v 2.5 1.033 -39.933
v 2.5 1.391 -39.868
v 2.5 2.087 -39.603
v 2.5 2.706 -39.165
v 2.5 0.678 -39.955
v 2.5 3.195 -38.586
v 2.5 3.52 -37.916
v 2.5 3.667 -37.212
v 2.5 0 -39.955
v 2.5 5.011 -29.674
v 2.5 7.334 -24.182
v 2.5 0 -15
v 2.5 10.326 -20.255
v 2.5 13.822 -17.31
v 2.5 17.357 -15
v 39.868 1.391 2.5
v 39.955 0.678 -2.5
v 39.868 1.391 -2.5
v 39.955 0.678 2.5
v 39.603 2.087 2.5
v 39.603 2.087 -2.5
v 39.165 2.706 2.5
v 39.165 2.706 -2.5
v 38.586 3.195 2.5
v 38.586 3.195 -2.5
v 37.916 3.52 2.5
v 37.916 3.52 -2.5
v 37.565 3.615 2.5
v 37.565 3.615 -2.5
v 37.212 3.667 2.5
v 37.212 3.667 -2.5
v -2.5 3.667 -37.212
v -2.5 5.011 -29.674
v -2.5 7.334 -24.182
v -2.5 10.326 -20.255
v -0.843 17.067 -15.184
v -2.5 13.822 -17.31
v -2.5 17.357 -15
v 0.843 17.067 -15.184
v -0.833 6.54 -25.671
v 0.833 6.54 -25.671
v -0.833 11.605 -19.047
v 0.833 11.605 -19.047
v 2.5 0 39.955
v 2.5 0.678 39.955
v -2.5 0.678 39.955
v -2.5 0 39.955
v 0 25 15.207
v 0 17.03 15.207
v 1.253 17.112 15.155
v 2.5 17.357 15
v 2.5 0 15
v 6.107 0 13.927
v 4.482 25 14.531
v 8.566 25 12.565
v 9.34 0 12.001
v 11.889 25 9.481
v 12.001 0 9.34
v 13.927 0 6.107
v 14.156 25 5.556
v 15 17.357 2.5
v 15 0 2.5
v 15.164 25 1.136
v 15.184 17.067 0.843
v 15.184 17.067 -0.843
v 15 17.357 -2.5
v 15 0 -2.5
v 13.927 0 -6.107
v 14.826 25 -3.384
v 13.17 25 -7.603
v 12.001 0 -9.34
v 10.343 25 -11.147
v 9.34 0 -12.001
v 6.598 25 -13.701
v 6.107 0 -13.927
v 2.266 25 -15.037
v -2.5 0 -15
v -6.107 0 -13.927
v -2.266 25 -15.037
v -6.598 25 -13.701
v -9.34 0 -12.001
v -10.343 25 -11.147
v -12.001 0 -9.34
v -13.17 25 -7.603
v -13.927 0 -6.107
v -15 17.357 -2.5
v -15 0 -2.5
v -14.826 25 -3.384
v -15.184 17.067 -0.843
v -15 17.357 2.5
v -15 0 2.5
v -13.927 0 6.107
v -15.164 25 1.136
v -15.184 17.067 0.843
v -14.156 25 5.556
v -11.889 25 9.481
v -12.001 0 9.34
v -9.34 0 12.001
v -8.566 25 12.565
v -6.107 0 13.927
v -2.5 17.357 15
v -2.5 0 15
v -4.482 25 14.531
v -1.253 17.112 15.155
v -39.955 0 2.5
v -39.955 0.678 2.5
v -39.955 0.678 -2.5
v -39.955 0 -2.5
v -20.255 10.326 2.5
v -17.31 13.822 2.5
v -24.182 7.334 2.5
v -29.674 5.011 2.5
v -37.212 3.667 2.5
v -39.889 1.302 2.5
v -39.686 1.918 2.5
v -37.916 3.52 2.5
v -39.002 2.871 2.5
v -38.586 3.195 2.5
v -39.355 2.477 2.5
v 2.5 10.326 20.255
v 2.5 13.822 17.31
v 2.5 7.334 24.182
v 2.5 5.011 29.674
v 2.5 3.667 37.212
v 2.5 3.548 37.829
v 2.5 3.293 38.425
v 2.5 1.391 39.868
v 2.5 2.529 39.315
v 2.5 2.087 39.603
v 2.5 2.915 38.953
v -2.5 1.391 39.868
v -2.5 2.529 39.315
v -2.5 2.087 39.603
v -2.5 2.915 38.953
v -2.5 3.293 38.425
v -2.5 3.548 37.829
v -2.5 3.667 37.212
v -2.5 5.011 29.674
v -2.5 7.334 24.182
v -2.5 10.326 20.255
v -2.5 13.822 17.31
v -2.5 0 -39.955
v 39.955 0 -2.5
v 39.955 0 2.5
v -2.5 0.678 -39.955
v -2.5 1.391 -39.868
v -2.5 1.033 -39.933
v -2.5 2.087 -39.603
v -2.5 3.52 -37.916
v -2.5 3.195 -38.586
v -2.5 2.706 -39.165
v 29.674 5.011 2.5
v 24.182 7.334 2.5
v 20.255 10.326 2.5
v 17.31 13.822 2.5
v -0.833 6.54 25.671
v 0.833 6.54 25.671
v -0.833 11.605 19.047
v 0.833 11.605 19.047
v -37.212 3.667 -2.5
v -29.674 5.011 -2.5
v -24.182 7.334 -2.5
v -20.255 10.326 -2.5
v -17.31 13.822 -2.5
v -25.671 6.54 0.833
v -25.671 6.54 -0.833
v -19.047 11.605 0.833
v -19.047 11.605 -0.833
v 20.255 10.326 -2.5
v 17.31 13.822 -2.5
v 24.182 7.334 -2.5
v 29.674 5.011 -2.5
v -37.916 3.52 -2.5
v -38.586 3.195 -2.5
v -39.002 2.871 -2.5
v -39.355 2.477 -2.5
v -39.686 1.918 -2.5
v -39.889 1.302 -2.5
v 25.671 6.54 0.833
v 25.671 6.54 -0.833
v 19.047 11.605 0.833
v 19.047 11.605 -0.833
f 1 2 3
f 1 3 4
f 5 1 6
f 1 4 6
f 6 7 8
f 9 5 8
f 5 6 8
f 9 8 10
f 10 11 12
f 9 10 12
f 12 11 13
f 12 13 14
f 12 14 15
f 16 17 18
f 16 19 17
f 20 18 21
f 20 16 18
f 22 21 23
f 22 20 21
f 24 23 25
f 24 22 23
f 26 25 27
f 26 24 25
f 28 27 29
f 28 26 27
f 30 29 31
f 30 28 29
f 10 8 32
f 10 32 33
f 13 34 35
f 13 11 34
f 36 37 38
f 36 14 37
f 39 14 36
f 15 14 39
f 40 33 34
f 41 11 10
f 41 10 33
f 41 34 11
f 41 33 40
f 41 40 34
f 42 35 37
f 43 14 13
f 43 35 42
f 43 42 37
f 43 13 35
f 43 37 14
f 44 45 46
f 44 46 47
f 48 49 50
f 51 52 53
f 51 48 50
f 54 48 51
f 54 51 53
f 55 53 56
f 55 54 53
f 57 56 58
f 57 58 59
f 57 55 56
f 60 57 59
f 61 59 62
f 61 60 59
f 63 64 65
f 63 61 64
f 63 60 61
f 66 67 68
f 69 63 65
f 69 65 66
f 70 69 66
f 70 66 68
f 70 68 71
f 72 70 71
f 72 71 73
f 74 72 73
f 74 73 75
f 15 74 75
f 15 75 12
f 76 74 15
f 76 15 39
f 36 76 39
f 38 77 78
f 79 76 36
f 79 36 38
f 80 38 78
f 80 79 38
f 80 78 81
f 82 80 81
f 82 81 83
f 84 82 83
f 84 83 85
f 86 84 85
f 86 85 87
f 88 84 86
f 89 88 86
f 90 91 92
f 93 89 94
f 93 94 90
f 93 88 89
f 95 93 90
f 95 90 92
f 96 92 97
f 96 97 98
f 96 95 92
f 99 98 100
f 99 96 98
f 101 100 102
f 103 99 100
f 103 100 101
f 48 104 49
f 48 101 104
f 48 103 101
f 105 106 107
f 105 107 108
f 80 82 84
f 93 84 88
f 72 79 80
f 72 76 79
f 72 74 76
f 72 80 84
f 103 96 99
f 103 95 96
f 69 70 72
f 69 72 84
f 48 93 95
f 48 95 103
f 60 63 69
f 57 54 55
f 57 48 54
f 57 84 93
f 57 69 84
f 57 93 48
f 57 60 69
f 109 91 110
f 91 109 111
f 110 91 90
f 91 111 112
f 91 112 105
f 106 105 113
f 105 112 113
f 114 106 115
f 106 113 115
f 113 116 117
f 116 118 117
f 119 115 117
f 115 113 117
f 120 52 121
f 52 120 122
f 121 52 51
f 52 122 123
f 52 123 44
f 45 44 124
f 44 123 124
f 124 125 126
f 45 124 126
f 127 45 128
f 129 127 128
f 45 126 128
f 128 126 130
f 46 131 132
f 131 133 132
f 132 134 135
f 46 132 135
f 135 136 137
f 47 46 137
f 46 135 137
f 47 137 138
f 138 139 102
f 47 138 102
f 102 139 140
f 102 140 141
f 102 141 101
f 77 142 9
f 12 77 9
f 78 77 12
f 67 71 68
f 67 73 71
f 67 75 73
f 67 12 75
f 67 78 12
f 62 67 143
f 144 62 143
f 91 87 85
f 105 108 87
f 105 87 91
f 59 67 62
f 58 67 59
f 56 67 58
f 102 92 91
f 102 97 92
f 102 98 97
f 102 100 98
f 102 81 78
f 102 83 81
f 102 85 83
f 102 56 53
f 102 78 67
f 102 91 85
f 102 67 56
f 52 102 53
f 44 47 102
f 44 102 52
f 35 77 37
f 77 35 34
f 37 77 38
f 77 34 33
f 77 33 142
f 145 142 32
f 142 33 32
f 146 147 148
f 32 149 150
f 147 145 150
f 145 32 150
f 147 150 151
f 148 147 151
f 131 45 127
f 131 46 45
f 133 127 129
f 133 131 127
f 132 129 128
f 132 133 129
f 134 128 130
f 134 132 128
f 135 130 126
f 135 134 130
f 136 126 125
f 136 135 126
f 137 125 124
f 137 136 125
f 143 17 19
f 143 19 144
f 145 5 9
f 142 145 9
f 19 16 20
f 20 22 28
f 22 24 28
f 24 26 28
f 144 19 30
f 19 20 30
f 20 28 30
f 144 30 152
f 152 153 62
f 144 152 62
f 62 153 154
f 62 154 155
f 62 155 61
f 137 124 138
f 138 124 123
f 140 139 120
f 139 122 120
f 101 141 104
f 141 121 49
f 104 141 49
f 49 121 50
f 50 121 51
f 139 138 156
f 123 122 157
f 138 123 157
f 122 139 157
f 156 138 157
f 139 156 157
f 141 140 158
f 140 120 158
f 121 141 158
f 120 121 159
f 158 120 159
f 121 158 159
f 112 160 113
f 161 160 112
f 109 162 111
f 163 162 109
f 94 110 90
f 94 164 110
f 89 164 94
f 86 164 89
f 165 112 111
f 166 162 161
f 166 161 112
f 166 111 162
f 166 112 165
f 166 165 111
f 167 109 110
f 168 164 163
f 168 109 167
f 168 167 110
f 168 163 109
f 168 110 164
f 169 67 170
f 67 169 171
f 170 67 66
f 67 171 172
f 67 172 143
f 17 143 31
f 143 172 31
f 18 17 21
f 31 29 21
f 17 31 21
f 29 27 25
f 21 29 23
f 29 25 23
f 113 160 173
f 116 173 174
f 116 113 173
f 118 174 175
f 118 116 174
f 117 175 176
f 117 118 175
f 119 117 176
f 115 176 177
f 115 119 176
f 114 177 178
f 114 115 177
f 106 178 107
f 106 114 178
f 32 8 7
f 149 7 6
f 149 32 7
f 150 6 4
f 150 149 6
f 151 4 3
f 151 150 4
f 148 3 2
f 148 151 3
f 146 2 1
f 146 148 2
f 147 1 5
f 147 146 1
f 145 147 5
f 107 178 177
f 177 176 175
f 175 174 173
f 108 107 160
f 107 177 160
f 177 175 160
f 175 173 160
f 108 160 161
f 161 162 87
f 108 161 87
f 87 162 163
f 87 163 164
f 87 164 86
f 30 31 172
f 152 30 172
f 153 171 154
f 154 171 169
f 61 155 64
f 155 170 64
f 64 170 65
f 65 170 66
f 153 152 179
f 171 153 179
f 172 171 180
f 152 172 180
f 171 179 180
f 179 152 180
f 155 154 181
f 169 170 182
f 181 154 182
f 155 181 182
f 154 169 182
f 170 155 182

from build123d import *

# Parameters (mm, degrees)
SKETCH3_W           = 30
SKETCH3_H           = 5
SKETCH3_W_2         = 5
SKETCH3_H_2         = 30
BOSS_EXTRUDE2_DEPTH = 25
CUT_EXTRUDE2_DEPTH  = 35.003676272
BOSS_EXTRUDE3_DEPTH = 5
SKETCH9_W           = 12.5
SKETCH9_H           = 5
CUT_EXTRUDE3_DEPTH  = 50.460787365
CIRPATTERN9_COUNT   = 4
SKETCH11_W          = 30
SKETCH11_H          = 25
BOSS_EXTRUDE5_DEPTH = 2.5
FILLET1_R           = 3
BOSS_EXTRUDE6_REACH = 63.788
SKETCH12_R          = 15.206906326


with BuildPart() as part:
    # Sketch3 → Boss-Extrude2 (new body)
    with BuildSketch(Plane(origin=(0, 0, 0), x_dir=(1, 0, 0), z_dir=(0, 1, 0))):
        Rectangle(SKETCH3_W, SKETCH3_H)
        Rectangle(SKETCH3_W_2, SKETCH3_H_2)
    extrude(amount=BOSS_EXTRUDE2_DEPTH)

    # Sketch4 → Cut-Extrude2 (cut, symmetric)
    with BuildSketch(Plane(origin=(2.5, 0, 0), x_dir=(0, 0, -1), z_dir=(1, 0, 0))):
        with BuildLine():
            Line((-15, 25), (-15, 17.357377201))
            add(Edge.make_bspline(
                [(-15, 17.357377201), (-12.472140197, 21.356054213), (-10.128526377, 24.727998236), (-4.127581327, 25)],
                knots=[0.577139171, 0.577139171, 0.577139171, 0.577139171, 0.966590179, 0.966590179, 0.966590179, 0.966590179], degree=3))
            Line((-4.127581327, 25), (-15, 25))
        make_face()
    cut_extrude2 = extrude(amount=CUT_EXTRUDE2_DEPTH, both=True, mode=Mode.SUBTRACT)

    # Sketch5 → Boss-Extrude3 (add)
    with BuildSketch(Plane(origin=(2.5, 0, 0), x_dir=(0, 0, -1), z_dir=(1, 0, 0))):
        with BuildLine():
            Line((-39.95459265, 0), (-15, 0))
            Line((-15, 0), (-15, 17.357377201))
            add(Edge.make_bspline(
                [(-39.95459265, 3.5), (-22.896848779, 4.129478661), (-18.746111538, 11.431617363), (-15, 17.357377201)],
                knots=[0, 0, 0, 0, 0.577139171, 0.577139171, 0.577139171, 0.577139171], degree=3))
            Line((-39.95459265, 3.5), (-39.95459265, 0))
        make_face()
    boss_extrude3 = extrude(amount=-BOSS_EXTRUDE3_DEPTH)

    # Mirror1: Boss-Extrude3 across plane
    add(boss_extrude3.mirror(Plane.XY))

    # Mirror2: Cut-Extrude2 across plane
    add(cut_extrude2.mirror(Plane.XY), mode=Mode.SUBTRACT)

    # Sketch9 → Cut-Extrude3 (cut, through all)
    with BuildSketch(Plane(origin=(0, 25, 0), x_dir=(1, 0, 0), z_dir=(0, 1, 0))):
        with Locations((-8.75, 0)):
            Rectangle(SKETCH9_W, SKETCH9_H)
        with Locations((8.75, 0)):
            Rectangle(SKETCH9_W, SKETCH9_H)
    extrude(amount=-CUT_EXTRUDE3_DEPTH, mode=Mode.SUBTRACT)


with BuildPart() as cirpattern9_1:
    # CirPattern9: pattern copy
    add(part.part.rotate(Axis((0, 0, 0), (0, 1, 0)), 1 * 360 / CIRPATTERN9_COUNT))


with BuildPart() as cirpattern9_2:
    # CirPattern9: pattern copy
    add(part.part.rotate(Axis((0, 0, 0), (0, 1, 0)), 2 * 360 / CIRPATTERN9_COUNT))


with BuildPart() as cirpattern9_3:
    # CirPattern9: pattern copy
    add(part.part.rotate(Axis((0, 0, 0), (0, 1, 0)), 3 * 360 / CIRPATTERN9_COUNT))


with BuildPart() as part_1:
    add(part.part)

    add(cirpattern9_1.part)  # Boss-Extrude5 merges CirPattern9_1

    add(cirpattern9_2.part)  # Boss-Extrude5 merges CirPattern9_2

    add(cirpattern9_3.part)  # Boss-Extrude5 merges CirPattern9_3
    # Sketch11 → Boss-Extrude5 (add, symmetric)
    with BuildSketch(Plane(origin=(0, 0, 0), x_dir=(0.7071067811865489, 0, 0.7071067811865462), z_dir=(-0.7071067811865462, 0, 0.7071067811865489))):
        with Locations((0, 12.5)):
            Rectangle(SKETCH11_W, SKETCH11_H)
    extrude(amount=BOSS_EXTRUDE5_DEPTH, both=True)

    # Fillet1
    fillet1_edges = [part_1.edges().sort_by_distance(p)[0] for p in [
        (0, 3.5, -39.95459265),
        (39.95459265, 3.5, 0),
        (0, 3.5, 39.95459265),
        (-39.95459265, 3.5, 0),
    ]]
    fillet(fillet1_edges, radius=FILLET1_R)

    # Boss-Extrude6: up to this face of the body (flat: up to its plane)
    boss_extrude6_end = Plane(part_1.part.faces().sort_by_distance((0, 0, 0))[0])
    # Sketch12 → Boss-Extrude6 (add, up to the picked face)
    with BuildSketch(Plane(origin=(0, 25, 0), x_dir=(1, 0, 0), z_dir=(0, 1, 0)), mode=Mode.PRIVATE) as boss_extrude6_sk1:
        with Locations(Location((0, 0, 0), (0, 0, 270))):
            Circle(SKETCH12_R)
    boss_extrude6_tool1 = split(extrude(boss_extrude6_sk1.sketch, amount=-BOSS_EXTRUDE6_REACH, mode=Mode.PRIVATE), bisect_by=boss_extrude6_end, keep=Keep.BOTH, mode=Mode.PRIVATE)
    add(boss_extrude6_tool1.solids().sort_by(Axis((0, 25, 0), (0, -1, 0)))[0])


solid = part_1.part
